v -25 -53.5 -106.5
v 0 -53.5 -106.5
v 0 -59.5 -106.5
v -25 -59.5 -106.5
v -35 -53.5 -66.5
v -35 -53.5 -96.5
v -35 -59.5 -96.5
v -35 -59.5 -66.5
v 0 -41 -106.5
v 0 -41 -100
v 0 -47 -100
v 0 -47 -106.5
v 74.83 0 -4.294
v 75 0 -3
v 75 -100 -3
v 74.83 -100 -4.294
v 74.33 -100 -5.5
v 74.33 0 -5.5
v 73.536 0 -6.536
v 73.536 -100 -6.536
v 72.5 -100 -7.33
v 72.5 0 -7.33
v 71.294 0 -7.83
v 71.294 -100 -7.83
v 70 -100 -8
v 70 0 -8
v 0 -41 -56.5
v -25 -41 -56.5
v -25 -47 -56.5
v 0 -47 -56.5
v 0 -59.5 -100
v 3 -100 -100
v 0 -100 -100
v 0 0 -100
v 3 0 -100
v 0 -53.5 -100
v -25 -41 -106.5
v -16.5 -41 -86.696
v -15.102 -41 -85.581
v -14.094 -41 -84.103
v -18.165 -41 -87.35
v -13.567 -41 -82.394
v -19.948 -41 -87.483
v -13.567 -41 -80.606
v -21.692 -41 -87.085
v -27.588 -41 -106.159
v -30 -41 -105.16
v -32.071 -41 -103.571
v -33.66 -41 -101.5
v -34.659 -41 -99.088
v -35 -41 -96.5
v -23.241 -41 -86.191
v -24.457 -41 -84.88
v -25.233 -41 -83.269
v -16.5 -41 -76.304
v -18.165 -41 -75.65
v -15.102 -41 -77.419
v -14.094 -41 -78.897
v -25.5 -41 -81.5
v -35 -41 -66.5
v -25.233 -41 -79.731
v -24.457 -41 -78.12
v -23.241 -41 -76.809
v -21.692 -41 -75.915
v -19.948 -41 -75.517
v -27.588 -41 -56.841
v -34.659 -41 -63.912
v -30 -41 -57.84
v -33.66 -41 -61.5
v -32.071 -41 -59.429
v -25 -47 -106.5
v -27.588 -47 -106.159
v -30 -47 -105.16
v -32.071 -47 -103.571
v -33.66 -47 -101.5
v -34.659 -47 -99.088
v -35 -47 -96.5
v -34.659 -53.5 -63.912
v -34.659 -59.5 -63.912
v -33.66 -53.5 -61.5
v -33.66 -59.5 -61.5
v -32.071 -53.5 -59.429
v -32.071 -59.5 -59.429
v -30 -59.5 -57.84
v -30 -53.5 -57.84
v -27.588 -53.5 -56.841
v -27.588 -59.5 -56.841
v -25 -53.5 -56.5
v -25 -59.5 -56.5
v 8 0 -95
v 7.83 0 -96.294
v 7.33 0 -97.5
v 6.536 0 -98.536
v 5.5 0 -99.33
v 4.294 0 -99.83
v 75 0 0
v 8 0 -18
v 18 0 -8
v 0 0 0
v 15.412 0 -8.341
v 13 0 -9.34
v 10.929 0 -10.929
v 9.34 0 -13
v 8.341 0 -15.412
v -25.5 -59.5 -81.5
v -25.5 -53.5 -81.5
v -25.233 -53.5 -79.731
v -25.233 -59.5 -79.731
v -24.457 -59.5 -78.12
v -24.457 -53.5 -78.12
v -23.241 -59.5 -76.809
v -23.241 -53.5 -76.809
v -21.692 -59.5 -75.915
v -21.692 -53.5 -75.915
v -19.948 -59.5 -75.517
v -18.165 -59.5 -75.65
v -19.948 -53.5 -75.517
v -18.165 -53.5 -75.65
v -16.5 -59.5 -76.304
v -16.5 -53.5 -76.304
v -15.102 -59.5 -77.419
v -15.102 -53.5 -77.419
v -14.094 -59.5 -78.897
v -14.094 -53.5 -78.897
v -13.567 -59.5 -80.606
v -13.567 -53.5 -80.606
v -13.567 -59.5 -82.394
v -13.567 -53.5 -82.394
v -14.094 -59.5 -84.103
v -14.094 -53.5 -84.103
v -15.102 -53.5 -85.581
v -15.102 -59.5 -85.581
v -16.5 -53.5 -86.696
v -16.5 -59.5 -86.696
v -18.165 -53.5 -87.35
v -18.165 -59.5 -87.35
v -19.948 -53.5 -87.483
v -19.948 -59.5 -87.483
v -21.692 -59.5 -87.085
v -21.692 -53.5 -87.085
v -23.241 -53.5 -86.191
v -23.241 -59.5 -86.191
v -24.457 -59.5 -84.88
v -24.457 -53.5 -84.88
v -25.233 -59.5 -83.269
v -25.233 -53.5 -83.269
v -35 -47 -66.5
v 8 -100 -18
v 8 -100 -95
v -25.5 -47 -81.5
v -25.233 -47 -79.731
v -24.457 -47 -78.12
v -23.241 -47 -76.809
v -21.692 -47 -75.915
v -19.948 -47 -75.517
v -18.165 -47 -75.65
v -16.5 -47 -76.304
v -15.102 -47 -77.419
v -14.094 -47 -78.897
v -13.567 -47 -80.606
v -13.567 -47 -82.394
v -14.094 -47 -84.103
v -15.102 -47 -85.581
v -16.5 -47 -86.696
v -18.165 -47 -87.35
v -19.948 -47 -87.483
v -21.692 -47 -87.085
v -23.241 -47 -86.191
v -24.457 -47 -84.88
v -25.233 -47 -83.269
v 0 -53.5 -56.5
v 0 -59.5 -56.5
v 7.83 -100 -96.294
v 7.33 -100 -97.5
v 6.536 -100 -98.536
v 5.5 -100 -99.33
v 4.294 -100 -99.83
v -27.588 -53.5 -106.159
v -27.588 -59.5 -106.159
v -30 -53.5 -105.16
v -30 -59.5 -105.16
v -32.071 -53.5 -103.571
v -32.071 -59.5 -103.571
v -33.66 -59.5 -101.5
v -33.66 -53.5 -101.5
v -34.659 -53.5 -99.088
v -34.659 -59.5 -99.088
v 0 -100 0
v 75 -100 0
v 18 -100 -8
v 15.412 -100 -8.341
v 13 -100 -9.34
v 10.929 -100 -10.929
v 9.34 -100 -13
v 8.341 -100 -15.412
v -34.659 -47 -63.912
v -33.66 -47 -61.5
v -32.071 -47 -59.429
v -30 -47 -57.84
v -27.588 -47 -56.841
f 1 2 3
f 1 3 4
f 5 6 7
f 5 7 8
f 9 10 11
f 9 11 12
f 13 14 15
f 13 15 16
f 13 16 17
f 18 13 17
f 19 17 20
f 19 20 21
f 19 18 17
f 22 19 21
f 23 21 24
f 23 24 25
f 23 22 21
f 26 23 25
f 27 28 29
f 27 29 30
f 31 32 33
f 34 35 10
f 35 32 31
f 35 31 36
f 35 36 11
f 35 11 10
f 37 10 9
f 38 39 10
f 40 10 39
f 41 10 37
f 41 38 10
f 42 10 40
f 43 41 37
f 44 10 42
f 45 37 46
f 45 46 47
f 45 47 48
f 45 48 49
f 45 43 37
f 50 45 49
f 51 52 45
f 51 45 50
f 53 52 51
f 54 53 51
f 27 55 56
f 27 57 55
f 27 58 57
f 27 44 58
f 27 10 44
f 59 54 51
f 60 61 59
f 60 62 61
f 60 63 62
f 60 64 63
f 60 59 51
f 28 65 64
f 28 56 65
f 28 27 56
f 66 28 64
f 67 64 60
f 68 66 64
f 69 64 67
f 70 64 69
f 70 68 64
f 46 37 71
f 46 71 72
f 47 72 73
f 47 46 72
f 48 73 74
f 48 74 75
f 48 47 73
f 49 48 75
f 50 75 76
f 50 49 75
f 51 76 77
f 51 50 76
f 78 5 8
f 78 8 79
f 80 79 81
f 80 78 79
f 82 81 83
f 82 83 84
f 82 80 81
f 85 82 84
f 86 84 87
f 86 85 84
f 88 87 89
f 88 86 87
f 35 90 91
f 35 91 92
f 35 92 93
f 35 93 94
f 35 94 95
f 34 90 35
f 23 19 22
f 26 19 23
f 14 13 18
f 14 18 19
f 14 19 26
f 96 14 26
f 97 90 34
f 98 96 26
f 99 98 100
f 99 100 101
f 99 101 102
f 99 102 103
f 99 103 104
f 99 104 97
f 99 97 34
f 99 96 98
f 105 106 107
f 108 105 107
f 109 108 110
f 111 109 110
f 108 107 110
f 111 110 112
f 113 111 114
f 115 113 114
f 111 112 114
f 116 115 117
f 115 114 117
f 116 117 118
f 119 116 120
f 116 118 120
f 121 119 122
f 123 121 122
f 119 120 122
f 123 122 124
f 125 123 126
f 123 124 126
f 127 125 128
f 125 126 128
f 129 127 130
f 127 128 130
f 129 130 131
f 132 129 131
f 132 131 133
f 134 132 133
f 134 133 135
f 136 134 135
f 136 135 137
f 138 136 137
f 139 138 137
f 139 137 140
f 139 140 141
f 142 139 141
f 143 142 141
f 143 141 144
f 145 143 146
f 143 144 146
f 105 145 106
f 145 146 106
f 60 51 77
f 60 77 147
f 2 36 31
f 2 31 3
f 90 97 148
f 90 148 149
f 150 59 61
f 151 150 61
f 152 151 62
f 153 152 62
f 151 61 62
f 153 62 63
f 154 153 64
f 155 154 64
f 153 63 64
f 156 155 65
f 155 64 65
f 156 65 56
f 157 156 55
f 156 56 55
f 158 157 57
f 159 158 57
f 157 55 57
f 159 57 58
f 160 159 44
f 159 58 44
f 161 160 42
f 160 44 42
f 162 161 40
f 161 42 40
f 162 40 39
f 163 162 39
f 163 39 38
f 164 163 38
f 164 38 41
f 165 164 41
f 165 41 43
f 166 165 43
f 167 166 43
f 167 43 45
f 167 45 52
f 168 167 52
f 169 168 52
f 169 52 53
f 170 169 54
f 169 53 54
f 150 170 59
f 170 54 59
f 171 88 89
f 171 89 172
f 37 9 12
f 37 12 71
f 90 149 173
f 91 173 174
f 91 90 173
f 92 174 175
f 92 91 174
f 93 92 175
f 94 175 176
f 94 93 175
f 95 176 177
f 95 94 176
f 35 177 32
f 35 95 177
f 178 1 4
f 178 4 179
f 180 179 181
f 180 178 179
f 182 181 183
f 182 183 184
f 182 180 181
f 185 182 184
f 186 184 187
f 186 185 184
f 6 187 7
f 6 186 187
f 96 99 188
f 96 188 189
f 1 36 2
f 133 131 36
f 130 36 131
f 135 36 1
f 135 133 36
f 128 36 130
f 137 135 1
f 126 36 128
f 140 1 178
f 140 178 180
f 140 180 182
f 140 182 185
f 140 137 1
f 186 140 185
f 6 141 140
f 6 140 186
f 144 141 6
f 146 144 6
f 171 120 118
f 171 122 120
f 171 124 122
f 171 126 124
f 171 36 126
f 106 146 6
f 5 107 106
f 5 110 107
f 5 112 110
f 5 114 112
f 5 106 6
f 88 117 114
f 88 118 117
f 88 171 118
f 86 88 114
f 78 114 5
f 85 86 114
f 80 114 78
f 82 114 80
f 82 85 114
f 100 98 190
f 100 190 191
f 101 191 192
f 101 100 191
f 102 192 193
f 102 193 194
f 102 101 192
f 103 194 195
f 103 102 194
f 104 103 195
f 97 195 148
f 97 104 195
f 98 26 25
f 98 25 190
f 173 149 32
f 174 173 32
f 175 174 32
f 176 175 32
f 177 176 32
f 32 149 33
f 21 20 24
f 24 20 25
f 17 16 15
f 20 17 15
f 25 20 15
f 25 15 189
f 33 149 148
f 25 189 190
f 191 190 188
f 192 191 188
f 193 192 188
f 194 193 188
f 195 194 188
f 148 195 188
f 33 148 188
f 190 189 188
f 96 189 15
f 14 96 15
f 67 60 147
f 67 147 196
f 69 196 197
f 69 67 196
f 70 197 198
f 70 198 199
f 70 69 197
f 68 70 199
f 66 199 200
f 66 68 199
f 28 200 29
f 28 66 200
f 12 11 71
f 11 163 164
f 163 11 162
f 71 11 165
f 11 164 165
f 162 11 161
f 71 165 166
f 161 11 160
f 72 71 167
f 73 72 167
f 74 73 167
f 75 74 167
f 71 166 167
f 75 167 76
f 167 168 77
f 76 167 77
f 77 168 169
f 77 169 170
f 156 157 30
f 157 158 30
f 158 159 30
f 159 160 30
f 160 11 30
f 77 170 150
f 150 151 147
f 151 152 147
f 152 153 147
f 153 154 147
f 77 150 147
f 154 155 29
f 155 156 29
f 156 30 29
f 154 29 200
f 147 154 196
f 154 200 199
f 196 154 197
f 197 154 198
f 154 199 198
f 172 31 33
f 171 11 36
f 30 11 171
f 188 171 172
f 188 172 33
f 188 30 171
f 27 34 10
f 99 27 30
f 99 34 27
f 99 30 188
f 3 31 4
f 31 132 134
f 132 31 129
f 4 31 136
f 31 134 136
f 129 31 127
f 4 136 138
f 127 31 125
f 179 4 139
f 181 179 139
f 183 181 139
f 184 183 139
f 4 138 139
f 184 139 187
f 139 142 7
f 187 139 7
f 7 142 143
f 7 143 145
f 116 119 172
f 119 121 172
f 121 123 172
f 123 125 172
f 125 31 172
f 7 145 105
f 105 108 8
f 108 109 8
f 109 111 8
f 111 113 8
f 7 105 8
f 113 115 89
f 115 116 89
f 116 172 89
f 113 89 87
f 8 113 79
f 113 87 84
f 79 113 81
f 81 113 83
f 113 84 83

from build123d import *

# Parameters (mm, degrees)
F1_DEPTH = 100
F3_R     = 6
F4_DEPTH = 6
F6_R     = 6
F7_DEPTH = 6
F8_ANGLE = 180


with BuildPart() as f1:
    # F0 (on Front) → F1 (new body)
    with BuildSketch(Plane.XZ):
        with BuildLine():
            Line((0, 0), (-75, 0))
            Line((-75, 0), (-75, -3))
            ThreePointArc((-75, -3), (-73.535534, -6.535534), (-70, -8))
            Line((-70, -8), (-18, -8))
            ThreePointArc((-18, -8), (-10.928932, -10.928932), (-8, -18))
            Line((-8, -18), (-8, -95))
            ThreePointArc((-8, -95), (-6.535534, -98.535534), (-3, -100))
            Line((-3, -100), (0, -100))
            Line((0, -100), (0, 0))
        make_face()
    extrude(amount=-F1_DEPTH)

    # F3 (on offset) → F4 (join)
    with BuildSketch(Plane.XZ.offset(-41)):
        with BuildLine():
            Line((25, -56.5), (0, -56.5))
            Line((0, -56.5), (0, -106.5))
            Line((0, -106.5), (25, -106.5))
            ThreePointArc((25, -106.5), (32.071068, -103.571068), (35, -96.5))
            Line((35, -96.5), (35, -66.5))
            ThreePointArc((35, -66.5), (32.071068, -59.428932), (25, -56.5))
        make_face()
        with Locations((19.5, -81.5)):
            Circle(F3_R, mode=Mode.SUBTRACT)
    extrude(amount=-F4_DEPTH)

    # F6 (on offset) → F7 (join)
    with BuildSketch(Plane.XZ.offset(-53.5)):
        with BuildLine():
            Line((25, -56.5), (0, -56.5))
            Line((0, -56.5), (0, -106.5))
            Line((0, -106.5), (25, -106.5))
            ThreePointArc((25, -106.5), (32.071068, -103.571068), (35, -96.5))
            Line((35, -96.5), (35, -66.5))
            ThreePointArc((35, -66.5), (32.071068, -59.428932), (25, -56.5))
        make_face()
        with Locations((19.5, -81.5)):
            Circle(F6_R, mode=Mode.SUBTRACT)
    extrude(amount=-F7_DEPTH)


with BuildPart() as f1_1:
    # F8: moved
    add(f1.part.rotate(Axis((0, 0, -50), (0, 0, 1)), F8_ANGLE))


solid = f1_1.part
